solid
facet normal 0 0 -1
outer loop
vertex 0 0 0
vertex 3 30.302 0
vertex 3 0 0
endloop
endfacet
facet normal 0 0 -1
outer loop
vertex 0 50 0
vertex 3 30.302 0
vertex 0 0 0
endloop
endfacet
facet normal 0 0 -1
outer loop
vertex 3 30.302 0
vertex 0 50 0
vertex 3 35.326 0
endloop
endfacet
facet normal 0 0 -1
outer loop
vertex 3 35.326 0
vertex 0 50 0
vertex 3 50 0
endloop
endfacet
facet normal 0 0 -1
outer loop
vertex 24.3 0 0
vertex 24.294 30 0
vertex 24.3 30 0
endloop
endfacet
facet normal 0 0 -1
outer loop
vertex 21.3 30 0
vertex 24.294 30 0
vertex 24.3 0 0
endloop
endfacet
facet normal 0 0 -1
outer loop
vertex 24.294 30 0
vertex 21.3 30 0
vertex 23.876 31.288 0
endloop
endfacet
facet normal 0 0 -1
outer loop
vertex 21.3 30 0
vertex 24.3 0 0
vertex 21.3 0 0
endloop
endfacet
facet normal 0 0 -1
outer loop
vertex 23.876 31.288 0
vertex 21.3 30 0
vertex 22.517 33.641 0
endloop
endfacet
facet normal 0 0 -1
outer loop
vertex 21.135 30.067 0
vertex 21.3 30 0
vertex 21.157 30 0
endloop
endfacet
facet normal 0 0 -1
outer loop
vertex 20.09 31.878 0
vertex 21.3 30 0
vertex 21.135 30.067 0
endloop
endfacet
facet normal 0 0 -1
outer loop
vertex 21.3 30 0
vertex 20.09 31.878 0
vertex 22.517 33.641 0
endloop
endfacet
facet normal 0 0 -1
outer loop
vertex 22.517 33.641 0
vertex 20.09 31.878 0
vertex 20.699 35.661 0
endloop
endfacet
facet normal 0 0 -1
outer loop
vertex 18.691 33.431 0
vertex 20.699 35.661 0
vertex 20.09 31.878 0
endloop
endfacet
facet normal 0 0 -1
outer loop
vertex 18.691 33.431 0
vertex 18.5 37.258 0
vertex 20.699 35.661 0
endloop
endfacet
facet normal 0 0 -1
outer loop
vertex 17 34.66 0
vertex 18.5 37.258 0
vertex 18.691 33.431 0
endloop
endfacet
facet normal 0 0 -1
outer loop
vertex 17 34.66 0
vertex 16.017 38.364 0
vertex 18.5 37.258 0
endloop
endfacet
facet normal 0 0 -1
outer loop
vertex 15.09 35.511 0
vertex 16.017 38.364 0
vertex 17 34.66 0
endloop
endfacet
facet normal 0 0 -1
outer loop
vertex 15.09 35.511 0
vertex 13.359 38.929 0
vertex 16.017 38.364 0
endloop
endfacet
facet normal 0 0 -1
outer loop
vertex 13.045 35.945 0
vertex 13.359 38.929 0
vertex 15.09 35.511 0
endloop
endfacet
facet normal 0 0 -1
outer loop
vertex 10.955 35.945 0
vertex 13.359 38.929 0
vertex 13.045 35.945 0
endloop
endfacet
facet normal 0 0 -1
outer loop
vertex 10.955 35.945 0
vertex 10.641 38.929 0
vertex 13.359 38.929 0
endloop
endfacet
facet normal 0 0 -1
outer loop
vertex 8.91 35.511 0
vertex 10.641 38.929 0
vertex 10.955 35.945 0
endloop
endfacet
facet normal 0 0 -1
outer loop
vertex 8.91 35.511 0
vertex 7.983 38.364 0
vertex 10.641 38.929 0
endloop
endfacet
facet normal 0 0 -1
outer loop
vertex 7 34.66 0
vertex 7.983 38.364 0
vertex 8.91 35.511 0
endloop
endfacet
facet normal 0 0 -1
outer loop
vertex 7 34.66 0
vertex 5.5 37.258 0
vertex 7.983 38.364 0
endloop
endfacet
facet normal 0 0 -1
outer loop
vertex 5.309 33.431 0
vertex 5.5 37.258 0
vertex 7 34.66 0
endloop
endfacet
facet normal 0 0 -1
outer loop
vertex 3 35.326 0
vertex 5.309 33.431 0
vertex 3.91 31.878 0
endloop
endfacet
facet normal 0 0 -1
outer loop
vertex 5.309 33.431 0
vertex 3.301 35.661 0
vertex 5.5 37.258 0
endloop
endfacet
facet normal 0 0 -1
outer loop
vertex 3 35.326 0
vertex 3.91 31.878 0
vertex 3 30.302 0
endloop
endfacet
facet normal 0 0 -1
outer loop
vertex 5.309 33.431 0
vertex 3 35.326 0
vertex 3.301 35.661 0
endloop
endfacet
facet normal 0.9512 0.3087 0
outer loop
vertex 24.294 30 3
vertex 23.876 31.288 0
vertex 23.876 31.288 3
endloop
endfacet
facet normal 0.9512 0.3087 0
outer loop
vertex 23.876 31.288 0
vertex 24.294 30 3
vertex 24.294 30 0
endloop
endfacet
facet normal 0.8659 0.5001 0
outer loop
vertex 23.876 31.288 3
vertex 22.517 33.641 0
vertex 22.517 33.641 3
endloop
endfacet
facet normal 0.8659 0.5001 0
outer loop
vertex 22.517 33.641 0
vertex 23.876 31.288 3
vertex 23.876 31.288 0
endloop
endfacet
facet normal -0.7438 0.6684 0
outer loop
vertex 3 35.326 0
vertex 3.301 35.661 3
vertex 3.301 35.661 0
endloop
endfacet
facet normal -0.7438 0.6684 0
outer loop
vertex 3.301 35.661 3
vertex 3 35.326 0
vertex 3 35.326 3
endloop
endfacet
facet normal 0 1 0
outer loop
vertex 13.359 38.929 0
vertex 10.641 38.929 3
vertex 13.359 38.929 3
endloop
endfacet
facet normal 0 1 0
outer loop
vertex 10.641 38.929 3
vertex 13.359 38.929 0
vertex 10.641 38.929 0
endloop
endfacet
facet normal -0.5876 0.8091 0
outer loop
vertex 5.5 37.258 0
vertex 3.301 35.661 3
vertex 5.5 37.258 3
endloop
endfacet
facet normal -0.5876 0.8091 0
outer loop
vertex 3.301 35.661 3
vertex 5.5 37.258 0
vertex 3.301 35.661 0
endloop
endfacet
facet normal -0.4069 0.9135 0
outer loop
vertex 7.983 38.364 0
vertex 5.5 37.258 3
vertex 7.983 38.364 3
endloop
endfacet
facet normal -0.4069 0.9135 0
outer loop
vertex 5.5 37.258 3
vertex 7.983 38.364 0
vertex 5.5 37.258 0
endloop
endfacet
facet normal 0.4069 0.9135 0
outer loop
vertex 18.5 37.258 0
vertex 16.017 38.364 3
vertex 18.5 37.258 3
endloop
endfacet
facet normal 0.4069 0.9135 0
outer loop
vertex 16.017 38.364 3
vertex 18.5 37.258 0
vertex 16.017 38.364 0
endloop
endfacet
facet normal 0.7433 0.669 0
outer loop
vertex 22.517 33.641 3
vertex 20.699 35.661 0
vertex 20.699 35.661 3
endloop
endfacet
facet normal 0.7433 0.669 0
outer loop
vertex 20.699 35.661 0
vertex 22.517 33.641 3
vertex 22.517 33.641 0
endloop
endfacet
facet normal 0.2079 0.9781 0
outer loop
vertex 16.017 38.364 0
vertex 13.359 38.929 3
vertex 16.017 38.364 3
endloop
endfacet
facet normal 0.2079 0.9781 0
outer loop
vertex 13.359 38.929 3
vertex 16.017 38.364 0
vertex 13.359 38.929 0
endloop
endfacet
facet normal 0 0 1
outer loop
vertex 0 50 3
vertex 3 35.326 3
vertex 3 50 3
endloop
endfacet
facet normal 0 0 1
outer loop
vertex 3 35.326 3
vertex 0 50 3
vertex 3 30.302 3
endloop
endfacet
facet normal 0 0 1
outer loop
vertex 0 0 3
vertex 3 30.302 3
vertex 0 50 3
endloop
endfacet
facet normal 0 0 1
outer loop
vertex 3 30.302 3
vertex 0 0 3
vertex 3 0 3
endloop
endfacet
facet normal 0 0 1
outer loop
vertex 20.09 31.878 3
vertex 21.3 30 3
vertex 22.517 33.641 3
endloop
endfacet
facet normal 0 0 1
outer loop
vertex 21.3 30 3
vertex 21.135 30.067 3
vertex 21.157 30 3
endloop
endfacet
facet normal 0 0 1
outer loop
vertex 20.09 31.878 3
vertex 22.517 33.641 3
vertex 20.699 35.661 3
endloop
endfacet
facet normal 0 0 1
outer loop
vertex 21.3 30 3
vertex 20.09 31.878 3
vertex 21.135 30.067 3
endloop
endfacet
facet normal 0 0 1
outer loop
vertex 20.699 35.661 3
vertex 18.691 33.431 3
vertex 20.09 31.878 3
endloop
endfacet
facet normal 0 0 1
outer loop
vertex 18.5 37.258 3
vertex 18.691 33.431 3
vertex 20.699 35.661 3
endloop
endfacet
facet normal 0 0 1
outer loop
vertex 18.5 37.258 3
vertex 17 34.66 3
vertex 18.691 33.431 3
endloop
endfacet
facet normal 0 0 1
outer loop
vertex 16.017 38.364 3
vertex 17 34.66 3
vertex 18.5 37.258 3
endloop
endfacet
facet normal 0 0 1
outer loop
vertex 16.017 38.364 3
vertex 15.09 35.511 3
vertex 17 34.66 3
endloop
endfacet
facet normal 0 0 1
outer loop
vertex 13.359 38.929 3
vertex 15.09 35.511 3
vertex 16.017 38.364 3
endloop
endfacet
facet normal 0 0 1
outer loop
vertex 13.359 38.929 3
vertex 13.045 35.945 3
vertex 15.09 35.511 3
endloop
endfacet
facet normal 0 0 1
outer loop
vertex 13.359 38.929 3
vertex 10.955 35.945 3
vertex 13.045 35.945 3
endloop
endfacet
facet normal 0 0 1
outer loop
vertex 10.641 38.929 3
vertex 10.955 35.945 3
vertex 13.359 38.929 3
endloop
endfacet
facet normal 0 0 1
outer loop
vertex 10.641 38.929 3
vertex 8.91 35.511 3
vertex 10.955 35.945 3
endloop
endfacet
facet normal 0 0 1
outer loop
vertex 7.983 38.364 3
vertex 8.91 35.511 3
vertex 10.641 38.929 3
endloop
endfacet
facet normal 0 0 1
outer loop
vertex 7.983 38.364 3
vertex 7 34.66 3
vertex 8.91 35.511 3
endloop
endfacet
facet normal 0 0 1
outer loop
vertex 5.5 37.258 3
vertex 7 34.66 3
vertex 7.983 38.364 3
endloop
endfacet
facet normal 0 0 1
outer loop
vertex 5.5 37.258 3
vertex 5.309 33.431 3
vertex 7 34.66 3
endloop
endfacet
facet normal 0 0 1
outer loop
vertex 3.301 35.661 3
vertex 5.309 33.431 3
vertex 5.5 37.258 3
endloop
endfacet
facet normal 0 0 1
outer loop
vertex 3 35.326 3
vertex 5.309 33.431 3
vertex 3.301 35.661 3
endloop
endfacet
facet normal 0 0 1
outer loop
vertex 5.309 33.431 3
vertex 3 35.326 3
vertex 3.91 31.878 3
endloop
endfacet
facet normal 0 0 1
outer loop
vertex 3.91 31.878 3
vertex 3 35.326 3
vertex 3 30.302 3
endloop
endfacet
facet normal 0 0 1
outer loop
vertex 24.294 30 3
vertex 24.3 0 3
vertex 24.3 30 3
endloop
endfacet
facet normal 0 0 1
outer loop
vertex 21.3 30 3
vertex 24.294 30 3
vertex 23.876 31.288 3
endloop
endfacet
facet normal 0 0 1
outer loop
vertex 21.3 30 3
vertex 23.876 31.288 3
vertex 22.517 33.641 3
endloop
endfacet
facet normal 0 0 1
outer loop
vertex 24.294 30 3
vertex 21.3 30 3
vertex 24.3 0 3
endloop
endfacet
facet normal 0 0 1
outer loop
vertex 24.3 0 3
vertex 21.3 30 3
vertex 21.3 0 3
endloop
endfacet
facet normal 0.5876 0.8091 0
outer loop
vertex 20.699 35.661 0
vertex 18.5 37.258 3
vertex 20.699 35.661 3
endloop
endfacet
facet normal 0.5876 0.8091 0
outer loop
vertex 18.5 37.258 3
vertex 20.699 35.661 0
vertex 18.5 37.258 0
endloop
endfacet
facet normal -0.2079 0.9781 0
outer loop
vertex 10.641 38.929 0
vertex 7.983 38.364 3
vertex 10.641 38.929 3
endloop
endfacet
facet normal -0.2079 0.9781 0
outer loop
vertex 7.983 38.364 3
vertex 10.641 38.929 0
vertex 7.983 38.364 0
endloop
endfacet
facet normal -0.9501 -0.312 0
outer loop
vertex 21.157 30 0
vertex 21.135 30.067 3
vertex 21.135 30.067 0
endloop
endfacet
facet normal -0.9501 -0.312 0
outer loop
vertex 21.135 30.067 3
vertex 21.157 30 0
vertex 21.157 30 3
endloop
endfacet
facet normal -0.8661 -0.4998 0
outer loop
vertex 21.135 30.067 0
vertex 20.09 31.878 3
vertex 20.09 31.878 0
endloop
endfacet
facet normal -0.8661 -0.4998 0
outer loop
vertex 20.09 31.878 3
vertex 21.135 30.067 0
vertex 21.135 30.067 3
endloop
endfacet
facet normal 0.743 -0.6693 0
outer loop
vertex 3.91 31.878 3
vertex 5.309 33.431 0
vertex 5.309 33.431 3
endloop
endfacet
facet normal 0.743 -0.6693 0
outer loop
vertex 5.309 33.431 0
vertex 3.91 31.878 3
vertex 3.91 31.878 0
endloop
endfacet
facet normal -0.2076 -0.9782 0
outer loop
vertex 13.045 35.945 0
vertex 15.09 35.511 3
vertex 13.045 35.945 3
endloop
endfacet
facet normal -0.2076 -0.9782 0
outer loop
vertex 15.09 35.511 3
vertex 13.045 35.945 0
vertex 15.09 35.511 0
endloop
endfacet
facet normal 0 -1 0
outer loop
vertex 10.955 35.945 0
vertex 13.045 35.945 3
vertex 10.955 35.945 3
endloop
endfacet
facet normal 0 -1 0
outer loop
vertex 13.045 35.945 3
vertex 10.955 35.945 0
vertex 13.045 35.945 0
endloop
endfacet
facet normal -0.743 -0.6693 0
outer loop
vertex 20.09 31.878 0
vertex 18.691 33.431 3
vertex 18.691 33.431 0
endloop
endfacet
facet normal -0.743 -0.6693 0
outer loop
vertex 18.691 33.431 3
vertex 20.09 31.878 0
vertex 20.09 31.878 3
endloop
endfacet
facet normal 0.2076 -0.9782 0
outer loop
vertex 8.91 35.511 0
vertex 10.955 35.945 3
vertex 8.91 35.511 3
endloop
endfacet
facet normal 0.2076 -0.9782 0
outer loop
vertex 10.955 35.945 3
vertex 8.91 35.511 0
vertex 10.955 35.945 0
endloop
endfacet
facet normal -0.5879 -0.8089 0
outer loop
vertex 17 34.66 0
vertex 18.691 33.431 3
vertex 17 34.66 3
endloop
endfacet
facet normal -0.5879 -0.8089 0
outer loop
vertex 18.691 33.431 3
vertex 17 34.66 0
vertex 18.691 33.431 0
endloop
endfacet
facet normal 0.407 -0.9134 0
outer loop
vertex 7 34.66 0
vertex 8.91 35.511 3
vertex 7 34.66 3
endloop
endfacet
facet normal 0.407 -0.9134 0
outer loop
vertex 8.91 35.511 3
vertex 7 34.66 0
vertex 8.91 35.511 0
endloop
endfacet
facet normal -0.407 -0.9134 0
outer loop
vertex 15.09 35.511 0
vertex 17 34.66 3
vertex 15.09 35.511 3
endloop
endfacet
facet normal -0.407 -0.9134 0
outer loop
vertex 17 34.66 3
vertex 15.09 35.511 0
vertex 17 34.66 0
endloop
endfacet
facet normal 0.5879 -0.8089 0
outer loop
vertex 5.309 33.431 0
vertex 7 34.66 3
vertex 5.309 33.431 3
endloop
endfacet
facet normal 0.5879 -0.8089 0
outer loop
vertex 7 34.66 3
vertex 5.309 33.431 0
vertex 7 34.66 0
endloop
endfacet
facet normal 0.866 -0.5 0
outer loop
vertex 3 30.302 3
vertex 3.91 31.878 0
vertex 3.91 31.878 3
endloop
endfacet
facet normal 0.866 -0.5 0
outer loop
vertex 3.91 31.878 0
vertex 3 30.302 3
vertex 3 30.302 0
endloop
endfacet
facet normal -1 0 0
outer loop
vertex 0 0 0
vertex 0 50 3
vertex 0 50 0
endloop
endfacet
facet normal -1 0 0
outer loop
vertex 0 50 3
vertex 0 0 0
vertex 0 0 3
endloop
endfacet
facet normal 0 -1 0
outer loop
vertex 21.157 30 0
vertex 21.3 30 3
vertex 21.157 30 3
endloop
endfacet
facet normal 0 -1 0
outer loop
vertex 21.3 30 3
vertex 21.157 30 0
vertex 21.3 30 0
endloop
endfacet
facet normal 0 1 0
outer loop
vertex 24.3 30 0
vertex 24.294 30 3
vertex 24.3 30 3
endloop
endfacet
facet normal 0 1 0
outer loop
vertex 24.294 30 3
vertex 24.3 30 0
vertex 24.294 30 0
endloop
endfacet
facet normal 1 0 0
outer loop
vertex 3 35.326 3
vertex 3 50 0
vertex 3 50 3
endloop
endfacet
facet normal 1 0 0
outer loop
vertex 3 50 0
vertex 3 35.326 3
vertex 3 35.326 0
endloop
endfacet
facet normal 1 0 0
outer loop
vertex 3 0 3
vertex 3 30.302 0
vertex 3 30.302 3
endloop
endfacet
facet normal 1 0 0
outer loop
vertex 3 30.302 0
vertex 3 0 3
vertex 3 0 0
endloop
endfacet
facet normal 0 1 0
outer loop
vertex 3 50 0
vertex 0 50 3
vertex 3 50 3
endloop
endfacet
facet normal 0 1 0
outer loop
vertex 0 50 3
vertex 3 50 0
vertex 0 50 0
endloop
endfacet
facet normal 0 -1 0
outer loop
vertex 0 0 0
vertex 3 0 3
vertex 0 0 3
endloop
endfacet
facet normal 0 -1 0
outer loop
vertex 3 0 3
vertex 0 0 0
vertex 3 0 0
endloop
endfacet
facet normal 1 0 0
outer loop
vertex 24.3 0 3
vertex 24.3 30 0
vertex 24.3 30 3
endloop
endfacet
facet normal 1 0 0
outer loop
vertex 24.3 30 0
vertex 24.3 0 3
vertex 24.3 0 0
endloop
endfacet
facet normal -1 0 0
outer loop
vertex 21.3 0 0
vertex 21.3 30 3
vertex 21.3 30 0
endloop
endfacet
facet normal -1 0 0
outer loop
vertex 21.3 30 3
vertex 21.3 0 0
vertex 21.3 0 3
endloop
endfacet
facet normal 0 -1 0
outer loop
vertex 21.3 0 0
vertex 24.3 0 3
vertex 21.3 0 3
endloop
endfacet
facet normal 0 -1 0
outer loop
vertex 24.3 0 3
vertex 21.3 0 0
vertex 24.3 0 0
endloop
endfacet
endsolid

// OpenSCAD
//буква h
union(){
cube([3,50,3]);
difference(){  
  translate([12,26,0]) cylinder(3,13,13);
  translate([12,26,0]) cylinder(3,10,10);
  translate([0,10,0]) cube([30,20,3]);
  translate([-3,0,0]) cube([3,40,3]);

}
  translate([21.3,0,0]) cube([3,30,3]);
}
